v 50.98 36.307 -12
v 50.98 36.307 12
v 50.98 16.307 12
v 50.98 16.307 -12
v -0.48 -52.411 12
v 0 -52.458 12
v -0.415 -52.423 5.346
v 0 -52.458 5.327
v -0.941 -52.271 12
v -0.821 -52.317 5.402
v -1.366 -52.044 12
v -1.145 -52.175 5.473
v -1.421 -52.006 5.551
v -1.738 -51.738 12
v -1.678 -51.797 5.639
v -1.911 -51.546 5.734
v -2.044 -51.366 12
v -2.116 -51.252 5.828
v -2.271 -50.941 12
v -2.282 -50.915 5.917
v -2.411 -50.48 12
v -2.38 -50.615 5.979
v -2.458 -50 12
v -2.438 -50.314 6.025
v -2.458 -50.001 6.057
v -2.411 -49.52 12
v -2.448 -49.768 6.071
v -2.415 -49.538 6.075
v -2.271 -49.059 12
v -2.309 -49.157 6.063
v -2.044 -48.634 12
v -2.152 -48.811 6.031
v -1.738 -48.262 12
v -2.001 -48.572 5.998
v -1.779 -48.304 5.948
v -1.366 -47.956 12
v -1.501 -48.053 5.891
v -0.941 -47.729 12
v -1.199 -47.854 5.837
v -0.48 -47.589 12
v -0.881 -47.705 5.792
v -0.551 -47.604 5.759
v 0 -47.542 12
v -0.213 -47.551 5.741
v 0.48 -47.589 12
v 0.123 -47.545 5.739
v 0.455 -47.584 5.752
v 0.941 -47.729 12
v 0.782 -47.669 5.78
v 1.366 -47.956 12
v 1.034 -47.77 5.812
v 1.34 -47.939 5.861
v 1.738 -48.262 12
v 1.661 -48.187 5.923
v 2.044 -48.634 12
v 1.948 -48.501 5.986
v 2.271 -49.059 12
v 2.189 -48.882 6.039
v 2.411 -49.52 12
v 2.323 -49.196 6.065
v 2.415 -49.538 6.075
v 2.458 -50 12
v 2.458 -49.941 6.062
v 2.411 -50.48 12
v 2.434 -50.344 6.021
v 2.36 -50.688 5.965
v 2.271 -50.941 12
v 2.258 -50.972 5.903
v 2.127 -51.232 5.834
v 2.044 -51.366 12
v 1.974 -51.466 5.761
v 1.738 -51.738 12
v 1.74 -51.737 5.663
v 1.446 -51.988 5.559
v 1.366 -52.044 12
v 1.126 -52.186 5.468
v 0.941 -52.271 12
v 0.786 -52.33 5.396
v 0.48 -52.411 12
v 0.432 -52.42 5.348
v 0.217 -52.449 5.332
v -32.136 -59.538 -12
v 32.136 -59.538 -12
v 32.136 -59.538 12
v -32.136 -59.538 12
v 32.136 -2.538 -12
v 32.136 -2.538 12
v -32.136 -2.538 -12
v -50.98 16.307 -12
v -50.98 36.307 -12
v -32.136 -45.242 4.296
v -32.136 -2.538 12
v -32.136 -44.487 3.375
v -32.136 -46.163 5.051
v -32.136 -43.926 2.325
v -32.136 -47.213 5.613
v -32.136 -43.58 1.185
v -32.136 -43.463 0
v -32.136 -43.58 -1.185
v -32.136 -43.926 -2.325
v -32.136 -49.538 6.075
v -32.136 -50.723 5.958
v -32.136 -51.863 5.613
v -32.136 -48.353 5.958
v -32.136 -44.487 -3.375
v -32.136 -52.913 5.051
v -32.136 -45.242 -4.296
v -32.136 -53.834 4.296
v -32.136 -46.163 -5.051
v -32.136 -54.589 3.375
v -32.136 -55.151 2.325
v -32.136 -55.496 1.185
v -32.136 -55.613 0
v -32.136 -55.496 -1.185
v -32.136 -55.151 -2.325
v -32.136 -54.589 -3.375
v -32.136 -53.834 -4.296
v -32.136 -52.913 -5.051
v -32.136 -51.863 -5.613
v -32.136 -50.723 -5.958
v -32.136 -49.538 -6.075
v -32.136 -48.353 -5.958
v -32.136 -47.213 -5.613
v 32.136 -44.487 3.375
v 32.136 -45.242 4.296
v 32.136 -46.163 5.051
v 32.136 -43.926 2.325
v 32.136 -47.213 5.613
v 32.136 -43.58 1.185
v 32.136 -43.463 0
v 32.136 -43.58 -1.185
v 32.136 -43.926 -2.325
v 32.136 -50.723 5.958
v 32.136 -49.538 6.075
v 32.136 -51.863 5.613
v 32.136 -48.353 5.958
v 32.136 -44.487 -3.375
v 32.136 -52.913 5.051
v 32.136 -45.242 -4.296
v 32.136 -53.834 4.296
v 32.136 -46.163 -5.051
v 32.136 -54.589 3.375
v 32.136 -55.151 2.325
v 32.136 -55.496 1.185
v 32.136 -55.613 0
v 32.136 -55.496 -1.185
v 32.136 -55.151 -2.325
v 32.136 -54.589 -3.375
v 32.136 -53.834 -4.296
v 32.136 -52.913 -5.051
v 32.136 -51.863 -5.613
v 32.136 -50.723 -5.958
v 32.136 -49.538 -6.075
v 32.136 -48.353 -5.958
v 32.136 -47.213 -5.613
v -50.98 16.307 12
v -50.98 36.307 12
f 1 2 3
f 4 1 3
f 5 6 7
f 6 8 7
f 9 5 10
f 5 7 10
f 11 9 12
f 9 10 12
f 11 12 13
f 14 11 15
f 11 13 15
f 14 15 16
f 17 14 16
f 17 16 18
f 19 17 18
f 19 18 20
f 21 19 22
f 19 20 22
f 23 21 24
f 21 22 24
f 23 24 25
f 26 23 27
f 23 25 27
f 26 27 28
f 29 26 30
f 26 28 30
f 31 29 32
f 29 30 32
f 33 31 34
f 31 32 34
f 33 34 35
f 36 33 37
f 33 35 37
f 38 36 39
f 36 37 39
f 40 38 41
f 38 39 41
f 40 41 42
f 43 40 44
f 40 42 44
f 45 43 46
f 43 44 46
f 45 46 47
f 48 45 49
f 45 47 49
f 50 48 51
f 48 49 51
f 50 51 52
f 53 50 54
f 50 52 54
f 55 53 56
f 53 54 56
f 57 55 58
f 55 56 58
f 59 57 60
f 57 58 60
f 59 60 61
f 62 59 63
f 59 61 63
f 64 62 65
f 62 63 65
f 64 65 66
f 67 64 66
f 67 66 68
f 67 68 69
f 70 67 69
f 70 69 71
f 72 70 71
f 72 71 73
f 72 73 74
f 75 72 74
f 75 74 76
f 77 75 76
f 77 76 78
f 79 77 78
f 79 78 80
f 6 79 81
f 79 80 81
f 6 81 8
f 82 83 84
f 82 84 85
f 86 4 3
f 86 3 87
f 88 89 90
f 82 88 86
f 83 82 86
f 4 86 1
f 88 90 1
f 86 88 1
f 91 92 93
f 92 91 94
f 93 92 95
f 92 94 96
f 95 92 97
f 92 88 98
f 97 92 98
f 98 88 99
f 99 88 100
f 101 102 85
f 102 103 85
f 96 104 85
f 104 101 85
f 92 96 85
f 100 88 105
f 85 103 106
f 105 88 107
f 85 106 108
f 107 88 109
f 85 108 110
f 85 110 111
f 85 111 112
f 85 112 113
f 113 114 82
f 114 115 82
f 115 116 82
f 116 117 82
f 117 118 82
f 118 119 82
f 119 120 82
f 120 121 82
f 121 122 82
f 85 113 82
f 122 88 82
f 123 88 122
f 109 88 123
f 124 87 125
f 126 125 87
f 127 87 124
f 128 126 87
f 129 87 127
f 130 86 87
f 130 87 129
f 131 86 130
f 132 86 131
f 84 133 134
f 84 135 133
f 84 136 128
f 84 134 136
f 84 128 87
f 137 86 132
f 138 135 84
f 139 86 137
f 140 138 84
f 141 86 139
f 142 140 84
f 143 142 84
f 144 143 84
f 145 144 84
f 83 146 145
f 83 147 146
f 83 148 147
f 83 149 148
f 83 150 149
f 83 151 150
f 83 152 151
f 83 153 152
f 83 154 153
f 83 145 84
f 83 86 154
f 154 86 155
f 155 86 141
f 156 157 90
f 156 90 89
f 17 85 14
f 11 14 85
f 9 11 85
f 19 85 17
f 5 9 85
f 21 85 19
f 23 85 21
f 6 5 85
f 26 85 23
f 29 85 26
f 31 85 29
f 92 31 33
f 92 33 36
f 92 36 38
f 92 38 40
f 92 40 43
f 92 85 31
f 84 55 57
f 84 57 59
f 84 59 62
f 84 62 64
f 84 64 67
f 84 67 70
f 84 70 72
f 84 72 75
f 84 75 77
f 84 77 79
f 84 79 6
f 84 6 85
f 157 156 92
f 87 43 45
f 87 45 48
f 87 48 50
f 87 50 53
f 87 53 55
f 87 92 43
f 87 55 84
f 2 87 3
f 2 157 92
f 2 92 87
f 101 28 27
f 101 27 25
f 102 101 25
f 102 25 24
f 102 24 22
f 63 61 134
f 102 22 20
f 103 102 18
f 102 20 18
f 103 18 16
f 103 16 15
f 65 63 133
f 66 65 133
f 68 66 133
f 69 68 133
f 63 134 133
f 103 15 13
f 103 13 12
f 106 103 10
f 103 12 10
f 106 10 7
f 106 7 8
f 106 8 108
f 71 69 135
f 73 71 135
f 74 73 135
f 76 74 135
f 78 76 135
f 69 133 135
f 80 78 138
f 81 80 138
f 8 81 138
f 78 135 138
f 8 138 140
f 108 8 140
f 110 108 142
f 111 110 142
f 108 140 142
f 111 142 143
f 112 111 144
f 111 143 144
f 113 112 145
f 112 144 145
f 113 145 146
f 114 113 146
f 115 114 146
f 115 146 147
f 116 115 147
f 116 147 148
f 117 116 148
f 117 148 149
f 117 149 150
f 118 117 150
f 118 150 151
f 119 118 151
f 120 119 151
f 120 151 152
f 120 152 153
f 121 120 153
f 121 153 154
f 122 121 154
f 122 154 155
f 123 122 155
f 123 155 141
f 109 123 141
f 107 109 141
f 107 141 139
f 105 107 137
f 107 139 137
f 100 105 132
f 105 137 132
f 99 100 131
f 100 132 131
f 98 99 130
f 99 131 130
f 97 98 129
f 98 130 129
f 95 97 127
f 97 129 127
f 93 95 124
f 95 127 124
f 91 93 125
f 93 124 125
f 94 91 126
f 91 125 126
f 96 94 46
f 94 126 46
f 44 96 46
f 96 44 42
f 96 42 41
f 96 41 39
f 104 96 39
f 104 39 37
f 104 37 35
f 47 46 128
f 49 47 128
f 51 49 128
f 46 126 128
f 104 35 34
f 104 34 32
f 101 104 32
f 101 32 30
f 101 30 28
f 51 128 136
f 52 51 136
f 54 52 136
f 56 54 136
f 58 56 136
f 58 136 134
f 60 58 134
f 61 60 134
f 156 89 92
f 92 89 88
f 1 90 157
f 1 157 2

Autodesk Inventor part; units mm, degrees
ref_plane "YZ Plane" through (0, 0, 0) normal (1, 0, 0) x (0, 1, 0)
ref_plane "XZ Plane" through (0, 0, 0) normal (0, 1, 0) x (-1, 0, 0)
ref_plane "XY Plane" through (0, 0, 0) normal (0, 0, 1) x (1, 0, 0)
sketch "Esboço1" plane through (0, 0, 0) normal (0, 0, 1) x (1, 0, 0)
  line L0 (0, 36.3068) -> (0, -8.6932) construction
  circle A0 centre (0, -8.6932) radius 68 construction
  line L1 (0, 36.3068) -> (50.9804, 36.3068)
  line L2 (50.9804, 36.3068) -> (50.9804, 16.3068)
  line L3 (50.9804, 16.3068) -> (32.1355, -2.5381)
  line L4 (32.1355, -2.5381) -> (32.1355, -59.5381)
  line L5 (32.1355, -59.5381) -> (0, -59.5381)
  line L6 (0, -76.6932) -> (0, 59.3068) construction
  line L7 (0, 36.3068) -> (-50.9804, 36.3068)
  line L8 (-50.9804, 36.3068) -> (-50.9804, 16.3068)
  line L9 (-50.9804, 16.3068) -> (-32.1355, -2.5381)
  line L10 (-32.1355, -2.5381) -> (-32.1355, -59.5381)
  line L11 (-32.1355, -59.5381) -> (0, -59.5381)
  point P0 (0, 0)
  dimension "d1" = 45
  dimension "d2" = 136
  dimension "d3" = 20
  dimension "d4" = 135
  dimension "d5" = 57
  dimension "d7" = 50.9804
  dimension "d41" = 32.1355
extrude "Extrusão1" add sketch "Esboço1" along normal mid plane 24
sketch "Esboço2" plane through (-32.1355, -59.5381, 12) normal (-1, 0, 0) x (0, 0, 1)
  line L0 (0, 0) -> (-24, 0) construction
  line L1 (-12, 0) -> (-12, 10) construction
  circle A0 centre (-12, 10) radius 6.075
  point P0 (-12, 59.5381)
  dimension "d10" = 10
  dimension "d11" = 12.15
hole "Furo1" at (-32.1355, -49.5381, 0) direction (1, 0, 0) diameter 12.15 end through all
sketch "Esboço3" plane through (0, 0, 12) normal (0, 0, 1) x (1, 0, 0)
  line L0 (0, 0) -> (0, -50) construction
  dimension "d42" = 50
hole "Furo2" at (0, -50, 12) direction (0, 0, -1) diameter 4.917 depth 10 tip angle 118 thread size "M6x1" class "6H" standard "ANSI Metric M Profile"
properties part number "suporte_guia_central" material "Alumínio 6061"
